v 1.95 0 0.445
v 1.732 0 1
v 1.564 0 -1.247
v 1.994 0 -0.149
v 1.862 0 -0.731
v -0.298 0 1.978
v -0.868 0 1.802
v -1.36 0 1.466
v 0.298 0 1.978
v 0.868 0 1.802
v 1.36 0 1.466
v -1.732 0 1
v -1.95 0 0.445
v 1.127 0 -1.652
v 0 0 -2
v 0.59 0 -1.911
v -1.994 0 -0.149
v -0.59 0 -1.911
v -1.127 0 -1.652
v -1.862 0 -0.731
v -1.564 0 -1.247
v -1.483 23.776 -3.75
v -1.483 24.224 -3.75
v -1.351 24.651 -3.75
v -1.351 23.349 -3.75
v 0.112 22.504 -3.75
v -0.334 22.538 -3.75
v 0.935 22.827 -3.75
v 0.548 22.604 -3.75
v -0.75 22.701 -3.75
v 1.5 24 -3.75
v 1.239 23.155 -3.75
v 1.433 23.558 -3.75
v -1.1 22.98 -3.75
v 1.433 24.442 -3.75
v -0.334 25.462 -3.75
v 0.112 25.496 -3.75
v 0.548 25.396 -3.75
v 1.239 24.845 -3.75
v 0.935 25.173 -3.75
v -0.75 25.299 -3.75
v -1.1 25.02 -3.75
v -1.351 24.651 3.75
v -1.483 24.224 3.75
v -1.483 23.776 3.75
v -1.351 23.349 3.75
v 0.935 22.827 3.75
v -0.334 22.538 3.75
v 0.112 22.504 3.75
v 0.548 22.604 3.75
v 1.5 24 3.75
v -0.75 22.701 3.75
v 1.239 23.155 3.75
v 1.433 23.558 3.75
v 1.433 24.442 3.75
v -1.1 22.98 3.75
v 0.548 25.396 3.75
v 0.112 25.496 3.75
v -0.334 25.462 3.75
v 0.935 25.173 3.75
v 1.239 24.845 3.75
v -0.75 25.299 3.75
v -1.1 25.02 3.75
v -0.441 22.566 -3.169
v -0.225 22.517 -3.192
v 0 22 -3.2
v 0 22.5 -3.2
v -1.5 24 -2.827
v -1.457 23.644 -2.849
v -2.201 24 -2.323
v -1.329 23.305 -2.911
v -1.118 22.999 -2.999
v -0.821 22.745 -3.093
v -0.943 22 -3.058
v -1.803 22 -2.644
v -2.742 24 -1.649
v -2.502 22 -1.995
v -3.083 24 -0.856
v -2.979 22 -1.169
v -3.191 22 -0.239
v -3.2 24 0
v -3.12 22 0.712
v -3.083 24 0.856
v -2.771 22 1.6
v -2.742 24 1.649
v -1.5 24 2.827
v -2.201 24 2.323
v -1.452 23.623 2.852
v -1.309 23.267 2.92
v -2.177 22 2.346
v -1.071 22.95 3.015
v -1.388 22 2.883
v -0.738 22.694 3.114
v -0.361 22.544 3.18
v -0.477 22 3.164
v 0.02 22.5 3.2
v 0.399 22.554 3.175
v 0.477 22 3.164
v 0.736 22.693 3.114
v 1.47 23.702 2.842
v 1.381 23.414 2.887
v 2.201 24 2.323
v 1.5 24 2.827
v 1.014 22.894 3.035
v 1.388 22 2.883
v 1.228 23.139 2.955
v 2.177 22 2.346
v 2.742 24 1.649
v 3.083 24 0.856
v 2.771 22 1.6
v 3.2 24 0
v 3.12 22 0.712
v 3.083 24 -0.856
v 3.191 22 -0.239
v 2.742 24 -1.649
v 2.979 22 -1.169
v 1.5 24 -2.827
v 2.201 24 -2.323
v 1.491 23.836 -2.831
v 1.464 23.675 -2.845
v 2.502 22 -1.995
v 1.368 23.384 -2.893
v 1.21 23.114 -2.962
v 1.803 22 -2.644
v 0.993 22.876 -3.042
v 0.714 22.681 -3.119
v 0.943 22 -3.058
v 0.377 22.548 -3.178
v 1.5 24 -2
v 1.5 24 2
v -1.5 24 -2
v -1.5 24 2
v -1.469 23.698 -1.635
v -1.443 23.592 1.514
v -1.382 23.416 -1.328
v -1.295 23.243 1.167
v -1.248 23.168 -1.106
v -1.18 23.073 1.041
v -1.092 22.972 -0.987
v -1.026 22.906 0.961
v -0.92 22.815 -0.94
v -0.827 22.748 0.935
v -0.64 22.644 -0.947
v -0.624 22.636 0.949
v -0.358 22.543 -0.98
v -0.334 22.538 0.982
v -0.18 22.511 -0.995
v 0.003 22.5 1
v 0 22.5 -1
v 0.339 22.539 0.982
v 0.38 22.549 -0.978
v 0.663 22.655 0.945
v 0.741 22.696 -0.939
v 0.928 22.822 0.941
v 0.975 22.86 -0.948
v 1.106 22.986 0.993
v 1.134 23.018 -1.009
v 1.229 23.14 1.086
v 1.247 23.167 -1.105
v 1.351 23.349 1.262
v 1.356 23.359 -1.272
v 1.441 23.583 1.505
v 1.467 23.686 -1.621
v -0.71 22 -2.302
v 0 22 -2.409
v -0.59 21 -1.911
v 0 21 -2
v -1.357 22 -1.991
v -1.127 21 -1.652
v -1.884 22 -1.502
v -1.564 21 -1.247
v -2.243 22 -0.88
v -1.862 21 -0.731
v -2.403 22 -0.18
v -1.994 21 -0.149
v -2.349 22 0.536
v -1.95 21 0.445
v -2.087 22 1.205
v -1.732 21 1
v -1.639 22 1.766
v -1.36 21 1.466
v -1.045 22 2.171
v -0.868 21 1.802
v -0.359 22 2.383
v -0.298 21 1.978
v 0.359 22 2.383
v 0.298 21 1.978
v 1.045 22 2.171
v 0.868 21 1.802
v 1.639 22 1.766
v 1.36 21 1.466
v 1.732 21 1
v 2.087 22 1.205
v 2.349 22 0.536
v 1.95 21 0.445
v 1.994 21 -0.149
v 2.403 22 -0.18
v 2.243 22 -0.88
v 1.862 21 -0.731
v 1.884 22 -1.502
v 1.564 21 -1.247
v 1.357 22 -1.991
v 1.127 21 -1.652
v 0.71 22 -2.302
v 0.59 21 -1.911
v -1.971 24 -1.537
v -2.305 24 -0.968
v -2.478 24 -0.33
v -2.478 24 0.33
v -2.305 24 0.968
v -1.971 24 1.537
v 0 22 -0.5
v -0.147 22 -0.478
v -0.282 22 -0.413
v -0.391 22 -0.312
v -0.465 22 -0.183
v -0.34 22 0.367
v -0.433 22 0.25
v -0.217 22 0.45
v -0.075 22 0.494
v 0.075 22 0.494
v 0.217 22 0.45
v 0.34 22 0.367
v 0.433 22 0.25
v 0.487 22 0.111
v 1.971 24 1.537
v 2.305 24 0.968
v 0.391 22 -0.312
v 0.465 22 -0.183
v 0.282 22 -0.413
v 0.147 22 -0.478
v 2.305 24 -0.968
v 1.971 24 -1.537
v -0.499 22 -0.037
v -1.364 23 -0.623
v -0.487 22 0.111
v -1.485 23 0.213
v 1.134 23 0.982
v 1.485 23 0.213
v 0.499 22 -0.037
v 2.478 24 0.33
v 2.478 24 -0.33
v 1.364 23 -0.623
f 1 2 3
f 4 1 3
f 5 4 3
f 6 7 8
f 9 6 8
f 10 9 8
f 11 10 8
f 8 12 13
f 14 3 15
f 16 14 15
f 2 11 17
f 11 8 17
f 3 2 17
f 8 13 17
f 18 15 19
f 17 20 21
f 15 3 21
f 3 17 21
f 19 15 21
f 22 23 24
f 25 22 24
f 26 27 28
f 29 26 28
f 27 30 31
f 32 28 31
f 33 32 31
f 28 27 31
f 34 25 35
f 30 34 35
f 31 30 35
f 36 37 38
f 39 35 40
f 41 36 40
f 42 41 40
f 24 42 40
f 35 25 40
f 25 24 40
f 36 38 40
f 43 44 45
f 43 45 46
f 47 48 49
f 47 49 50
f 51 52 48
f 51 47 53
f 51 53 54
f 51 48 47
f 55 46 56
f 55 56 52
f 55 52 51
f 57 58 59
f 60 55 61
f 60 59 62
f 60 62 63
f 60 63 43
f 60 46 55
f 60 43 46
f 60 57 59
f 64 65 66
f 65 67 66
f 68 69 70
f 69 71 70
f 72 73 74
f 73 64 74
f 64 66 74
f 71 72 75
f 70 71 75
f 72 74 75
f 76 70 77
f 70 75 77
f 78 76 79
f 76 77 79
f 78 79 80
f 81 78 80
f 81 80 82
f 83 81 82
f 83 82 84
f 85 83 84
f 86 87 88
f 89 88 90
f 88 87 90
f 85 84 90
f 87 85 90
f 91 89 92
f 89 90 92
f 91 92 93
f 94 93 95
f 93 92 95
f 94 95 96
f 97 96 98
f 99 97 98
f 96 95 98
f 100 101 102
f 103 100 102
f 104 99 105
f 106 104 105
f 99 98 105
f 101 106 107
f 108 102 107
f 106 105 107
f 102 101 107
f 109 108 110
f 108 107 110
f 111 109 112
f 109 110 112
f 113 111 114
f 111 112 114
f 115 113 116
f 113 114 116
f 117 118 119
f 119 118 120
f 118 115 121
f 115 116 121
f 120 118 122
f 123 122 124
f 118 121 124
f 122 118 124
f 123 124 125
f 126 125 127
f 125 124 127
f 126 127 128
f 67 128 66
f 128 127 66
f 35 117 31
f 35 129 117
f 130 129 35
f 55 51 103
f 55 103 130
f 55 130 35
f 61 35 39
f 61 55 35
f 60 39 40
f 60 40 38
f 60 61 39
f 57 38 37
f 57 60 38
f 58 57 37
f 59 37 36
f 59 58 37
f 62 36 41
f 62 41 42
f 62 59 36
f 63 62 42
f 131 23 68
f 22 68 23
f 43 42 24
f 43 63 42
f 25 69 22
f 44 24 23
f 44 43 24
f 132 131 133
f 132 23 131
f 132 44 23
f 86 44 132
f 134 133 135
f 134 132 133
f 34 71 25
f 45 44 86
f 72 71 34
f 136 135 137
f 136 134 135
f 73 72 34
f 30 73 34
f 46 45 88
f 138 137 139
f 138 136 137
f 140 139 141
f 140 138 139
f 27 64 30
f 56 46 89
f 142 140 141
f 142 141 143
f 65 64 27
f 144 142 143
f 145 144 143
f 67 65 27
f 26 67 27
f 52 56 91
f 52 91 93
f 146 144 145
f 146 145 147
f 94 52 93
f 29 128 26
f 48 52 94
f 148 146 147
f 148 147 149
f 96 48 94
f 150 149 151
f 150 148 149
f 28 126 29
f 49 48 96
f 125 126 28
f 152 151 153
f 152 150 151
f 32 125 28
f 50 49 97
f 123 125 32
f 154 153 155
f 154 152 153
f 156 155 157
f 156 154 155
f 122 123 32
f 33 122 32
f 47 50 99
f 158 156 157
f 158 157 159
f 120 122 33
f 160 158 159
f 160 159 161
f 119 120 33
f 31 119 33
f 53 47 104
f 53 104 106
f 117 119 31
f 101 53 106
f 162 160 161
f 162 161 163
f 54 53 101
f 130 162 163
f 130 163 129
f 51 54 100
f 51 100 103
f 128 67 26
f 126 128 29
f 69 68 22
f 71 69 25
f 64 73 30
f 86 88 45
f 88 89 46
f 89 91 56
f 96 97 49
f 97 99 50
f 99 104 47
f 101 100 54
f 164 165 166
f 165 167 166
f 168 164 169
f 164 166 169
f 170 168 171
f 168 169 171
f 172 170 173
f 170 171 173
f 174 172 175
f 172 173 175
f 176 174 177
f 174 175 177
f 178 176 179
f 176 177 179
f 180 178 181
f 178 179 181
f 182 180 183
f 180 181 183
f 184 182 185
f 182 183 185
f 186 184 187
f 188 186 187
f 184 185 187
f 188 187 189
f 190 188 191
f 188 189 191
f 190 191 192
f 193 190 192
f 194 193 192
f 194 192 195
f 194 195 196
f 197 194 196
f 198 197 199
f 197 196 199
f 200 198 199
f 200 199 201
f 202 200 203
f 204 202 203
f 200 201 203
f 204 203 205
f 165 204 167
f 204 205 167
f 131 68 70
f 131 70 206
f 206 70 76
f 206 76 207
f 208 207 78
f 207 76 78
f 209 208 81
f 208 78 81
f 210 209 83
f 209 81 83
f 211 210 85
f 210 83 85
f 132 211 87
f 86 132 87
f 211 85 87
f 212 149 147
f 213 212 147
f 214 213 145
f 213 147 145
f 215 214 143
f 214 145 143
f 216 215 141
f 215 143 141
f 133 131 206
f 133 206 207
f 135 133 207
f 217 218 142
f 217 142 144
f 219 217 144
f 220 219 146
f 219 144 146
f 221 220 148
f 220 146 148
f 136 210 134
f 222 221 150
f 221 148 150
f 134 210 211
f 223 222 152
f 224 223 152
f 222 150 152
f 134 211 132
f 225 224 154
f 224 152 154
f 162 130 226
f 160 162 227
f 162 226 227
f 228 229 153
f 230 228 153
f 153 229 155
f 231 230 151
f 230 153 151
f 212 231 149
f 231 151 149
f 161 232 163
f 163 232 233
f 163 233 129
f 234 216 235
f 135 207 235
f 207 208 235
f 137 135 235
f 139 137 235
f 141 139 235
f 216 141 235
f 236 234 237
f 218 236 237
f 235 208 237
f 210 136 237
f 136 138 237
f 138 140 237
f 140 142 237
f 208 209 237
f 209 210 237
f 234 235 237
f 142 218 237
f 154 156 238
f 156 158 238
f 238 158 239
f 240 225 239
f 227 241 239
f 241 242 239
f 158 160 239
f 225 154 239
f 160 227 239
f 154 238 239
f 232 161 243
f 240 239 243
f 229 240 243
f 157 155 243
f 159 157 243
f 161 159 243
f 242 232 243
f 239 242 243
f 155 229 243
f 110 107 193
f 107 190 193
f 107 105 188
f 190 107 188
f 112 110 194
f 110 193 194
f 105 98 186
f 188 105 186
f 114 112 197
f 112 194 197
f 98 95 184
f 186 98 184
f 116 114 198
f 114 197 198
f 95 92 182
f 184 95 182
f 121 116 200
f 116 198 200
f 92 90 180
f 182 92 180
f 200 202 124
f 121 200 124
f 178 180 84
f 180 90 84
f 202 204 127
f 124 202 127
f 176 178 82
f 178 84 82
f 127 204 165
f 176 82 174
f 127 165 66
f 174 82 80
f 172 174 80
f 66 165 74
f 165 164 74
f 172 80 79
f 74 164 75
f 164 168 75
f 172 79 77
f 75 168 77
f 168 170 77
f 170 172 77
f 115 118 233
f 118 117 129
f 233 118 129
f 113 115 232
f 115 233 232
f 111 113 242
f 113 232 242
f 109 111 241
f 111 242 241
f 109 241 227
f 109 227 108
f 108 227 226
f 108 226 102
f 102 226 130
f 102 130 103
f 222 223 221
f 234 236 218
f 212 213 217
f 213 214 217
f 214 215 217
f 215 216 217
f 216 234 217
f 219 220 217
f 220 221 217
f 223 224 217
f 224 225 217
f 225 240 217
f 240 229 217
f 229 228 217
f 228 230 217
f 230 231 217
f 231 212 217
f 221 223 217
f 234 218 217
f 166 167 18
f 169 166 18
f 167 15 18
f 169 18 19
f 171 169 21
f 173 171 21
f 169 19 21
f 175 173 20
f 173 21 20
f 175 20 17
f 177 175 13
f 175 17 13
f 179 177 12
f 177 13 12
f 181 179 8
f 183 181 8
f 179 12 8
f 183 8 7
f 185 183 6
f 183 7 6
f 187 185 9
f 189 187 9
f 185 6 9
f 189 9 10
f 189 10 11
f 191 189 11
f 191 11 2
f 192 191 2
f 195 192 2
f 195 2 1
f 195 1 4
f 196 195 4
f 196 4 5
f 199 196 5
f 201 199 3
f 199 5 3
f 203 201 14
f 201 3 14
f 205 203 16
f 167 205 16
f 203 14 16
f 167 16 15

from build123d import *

# Parameters (mm, degrees)
SKETCH2_R           = 1.5
BOSS_EXTRUDE1_DEPTH = 3.75


with BuildPart() as part:
    # Sketch1 → Revolve1 (revolve)
    with BuildSketch(Plane.XY, mode=Mode.PRIVATE) as revolve1_sk:
        Polygon((0, 0), (0, 22), (0.5, 22), (2.5, 24), (3.2, 24), (3.2, 22), (2.40945179, 22), (2, 21), (2, 0), align=None)
    revolve(revolve1_sk.sketch.rotate(Axis((0, 0, 0), (0, 1, 0)), 90), axis=Axis((0, 0, 0), (0, 1, 0)))

    # Sketch2 → Boss-Extrude1 (add, symmetric)
    with BuildSketch(Plane.XY):
        with Locations((0, 24)):
            Circle(SKETCH2_R)
    extrude(amount=BOSS_EXTRUDE1_DEPTH, both=True)


solid = part.part
